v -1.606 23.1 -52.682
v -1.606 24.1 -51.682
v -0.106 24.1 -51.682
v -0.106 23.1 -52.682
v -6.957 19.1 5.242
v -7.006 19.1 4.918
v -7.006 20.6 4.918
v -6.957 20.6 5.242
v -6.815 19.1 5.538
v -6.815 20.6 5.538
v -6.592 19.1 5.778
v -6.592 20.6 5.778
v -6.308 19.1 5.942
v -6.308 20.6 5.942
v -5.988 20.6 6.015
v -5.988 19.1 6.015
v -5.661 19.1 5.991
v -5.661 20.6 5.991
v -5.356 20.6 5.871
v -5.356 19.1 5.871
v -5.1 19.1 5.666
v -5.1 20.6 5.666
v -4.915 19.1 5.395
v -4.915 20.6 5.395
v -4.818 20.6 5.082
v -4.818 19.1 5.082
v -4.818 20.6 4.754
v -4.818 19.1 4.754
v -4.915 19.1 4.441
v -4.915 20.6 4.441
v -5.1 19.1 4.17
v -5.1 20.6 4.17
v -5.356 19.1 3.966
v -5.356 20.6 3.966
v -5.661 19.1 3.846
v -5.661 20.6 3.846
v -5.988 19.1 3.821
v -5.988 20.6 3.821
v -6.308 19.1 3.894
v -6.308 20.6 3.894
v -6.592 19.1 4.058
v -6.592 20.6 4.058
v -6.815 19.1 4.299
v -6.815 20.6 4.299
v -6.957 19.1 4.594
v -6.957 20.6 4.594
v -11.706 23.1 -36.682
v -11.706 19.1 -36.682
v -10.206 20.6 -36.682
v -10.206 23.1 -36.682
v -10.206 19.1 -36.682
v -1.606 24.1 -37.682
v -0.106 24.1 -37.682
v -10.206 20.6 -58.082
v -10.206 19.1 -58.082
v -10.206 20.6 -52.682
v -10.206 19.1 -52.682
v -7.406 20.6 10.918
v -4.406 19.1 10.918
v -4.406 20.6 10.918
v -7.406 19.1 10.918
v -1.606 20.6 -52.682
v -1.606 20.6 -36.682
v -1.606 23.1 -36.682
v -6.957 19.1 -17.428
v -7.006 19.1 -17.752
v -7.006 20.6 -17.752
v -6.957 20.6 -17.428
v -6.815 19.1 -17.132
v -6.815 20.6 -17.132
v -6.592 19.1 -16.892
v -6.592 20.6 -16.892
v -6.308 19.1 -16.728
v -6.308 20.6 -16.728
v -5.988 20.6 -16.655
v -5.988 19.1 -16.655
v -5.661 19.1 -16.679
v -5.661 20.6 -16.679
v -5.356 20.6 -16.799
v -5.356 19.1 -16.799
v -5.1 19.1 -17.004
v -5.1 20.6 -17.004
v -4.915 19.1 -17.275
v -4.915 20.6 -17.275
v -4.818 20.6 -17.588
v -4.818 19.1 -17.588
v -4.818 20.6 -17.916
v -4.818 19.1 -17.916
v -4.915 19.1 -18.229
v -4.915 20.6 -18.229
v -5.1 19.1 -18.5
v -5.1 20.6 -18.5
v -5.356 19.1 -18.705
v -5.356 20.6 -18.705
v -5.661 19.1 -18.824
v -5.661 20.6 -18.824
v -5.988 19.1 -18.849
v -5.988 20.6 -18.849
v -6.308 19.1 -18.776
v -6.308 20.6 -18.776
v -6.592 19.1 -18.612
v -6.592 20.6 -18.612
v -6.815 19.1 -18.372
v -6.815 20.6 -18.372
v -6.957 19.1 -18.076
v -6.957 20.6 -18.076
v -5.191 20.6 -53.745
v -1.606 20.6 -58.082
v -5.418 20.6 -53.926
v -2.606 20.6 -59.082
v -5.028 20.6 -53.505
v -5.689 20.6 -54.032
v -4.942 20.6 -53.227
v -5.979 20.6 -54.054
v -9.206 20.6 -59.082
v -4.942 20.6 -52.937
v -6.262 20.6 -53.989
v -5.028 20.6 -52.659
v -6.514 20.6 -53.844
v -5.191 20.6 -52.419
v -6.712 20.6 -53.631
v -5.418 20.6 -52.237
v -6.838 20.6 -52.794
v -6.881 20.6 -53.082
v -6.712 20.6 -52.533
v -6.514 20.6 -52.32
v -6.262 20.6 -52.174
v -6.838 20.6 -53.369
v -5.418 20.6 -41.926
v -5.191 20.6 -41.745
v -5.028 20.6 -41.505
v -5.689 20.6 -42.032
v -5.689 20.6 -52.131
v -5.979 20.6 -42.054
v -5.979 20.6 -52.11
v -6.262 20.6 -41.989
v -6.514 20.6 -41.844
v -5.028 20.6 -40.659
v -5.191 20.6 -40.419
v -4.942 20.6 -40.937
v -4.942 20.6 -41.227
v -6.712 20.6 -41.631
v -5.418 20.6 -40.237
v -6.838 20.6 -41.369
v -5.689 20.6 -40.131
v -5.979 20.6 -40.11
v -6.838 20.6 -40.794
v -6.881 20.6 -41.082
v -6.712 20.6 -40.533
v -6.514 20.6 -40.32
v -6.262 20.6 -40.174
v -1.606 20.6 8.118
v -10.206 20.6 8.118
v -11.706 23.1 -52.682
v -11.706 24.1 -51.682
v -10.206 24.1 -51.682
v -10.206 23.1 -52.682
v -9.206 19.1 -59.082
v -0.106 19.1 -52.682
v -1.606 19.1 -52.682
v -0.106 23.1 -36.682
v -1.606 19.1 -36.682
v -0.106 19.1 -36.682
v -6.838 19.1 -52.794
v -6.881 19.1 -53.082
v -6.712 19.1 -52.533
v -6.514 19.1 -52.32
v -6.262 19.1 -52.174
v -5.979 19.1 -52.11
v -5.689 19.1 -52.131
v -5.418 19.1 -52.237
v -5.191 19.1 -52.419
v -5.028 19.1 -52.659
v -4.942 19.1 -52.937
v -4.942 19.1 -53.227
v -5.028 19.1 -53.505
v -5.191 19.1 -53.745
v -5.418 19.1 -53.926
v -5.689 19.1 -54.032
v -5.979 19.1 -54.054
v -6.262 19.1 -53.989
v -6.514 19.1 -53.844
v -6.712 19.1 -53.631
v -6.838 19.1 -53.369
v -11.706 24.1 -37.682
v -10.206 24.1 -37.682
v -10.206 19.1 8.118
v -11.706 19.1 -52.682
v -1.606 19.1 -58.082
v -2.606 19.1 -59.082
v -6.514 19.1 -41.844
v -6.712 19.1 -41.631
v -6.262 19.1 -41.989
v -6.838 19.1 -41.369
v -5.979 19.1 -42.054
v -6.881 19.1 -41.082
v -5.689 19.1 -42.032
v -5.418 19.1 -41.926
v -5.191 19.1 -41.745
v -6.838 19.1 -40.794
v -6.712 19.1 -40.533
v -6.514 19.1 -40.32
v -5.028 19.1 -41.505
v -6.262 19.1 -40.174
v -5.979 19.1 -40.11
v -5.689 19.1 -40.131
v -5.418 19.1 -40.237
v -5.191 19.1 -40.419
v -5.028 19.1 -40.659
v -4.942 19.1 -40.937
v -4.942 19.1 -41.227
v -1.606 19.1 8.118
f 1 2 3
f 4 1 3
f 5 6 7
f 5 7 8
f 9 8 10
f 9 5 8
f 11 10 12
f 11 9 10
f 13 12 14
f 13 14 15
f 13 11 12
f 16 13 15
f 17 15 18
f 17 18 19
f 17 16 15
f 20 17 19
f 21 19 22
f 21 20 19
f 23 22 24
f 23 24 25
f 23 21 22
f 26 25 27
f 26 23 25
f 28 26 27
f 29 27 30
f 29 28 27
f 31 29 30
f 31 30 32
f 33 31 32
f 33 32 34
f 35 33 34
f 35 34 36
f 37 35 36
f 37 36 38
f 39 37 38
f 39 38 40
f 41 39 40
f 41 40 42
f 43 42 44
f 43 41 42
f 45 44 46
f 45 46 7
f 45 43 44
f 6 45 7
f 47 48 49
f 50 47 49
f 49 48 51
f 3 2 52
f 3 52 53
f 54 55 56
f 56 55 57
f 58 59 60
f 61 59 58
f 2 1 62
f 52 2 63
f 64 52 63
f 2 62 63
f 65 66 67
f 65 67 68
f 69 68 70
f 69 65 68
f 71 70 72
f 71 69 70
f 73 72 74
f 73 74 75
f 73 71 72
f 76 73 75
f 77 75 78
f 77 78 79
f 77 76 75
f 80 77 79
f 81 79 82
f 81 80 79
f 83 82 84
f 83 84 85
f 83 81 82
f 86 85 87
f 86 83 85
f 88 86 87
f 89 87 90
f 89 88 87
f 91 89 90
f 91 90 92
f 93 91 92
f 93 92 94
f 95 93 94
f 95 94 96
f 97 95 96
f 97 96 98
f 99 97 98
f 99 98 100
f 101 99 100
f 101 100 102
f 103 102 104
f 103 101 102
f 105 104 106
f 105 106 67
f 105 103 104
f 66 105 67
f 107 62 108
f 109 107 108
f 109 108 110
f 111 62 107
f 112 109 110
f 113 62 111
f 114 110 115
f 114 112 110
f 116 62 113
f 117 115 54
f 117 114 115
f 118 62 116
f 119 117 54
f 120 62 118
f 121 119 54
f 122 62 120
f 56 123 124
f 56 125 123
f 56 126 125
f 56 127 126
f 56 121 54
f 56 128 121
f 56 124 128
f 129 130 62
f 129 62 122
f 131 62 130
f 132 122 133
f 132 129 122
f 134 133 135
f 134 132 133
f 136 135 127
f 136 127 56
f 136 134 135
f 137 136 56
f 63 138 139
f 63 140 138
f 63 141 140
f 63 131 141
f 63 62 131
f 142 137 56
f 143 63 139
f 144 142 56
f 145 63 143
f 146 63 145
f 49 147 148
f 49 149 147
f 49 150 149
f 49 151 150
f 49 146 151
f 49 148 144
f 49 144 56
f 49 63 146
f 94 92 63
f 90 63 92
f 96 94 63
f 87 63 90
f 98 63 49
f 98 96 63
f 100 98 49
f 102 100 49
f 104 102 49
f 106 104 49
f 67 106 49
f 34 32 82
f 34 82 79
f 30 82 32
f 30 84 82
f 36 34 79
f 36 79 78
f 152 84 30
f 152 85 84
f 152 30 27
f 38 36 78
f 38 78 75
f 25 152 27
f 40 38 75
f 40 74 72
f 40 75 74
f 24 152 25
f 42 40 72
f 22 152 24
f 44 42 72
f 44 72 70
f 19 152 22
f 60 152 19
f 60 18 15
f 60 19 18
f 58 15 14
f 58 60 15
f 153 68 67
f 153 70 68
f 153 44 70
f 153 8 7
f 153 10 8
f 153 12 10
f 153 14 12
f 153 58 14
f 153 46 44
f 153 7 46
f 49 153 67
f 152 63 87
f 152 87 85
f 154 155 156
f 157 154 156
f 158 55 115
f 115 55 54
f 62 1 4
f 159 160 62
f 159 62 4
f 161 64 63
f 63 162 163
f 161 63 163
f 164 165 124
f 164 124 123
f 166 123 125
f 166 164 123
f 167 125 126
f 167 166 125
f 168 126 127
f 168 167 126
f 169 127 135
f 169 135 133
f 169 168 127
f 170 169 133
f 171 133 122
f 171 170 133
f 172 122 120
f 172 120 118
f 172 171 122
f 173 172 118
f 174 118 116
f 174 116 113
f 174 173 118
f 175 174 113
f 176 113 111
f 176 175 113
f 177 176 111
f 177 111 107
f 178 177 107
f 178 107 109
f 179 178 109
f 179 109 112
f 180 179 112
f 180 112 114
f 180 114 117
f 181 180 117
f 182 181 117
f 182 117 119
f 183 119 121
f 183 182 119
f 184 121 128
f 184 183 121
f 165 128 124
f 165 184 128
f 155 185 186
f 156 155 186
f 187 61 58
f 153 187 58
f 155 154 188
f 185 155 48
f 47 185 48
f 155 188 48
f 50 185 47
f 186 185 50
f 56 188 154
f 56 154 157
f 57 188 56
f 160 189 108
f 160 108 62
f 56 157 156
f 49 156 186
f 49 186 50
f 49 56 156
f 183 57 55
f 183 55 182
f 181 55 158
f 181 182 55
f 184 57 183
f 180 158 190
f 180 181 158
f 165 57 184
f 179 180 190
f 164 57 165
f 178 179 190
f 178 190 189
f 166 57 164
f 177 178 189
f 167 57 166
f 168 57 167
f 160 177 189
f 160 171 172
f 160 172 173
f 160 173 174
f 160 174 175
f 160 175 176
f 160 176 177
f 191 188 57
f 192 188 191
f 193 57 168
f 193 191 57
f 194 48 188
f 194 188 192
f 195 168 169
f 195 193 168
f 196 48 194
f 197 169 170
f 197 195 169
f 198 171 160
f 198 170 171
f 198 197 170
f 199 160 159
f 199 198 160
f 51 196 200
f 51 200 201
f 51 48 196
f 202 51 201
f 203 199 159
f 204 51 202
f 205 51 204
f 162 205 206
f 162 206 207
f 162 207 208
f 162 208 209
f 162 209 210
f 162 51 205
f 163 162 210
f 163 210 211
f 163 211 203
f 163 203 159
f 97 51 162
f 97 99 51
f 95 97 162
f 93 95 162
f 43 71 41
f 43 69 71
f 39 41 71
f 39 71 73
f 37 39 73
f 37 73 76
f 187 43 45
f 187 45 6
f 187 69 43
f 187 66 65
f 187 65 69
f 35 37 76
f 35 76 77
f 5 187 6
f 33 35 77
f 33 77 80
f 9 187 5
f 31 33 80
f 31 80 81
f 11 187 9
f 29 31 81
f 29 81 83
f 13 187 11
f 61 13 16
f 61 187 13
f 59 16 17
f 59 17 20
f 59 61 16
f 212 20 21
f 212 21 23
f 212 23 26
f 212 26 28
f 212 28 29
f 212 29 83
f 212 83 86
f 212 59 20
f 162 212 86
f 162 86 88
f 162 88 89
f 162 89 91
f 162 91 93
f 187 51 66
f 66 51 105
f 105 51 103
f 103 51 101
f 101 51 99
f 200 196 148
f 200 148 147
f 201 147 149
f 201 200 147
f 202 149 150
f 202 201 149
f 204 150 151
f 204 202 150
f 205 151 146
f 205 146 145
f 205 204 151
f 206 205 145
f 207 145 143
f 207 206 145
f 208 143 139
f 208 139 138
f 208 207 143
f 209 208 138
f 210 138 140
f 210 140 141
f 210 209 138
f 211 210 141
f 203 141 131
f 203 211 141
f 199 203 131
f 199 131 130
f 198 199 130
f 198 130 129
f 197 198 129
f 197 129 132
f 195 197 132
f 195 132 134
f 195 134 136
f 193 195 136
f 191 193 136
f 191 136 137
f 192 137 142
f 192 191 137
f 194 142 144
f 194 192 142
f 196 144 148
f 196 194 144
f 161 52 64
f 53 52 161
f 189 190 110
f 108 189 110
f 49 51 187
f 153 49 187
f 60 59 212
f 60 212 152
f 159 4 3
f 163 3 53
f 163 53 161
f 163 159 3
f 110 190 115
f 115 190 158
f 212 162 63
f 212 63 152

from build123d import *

# Parameters (mm, degrees)
SKETCH006_W              = 8.6
SKETCH006_H              = 70
SKETCH006_R              = 1.1
SKETCH006_R_2            = 0.975
PAD005_DEPTH             = 1.5
SKETCH007_W              = 1.5
SKETCH007_H              = 16
PAD006_DEPTH             = 5
CHAMFER001_SIZE          = 2.8
CHAMFER002_SIZE          = 1
CLONE002_PLACEMENT_ANGLE = 180


with BuildPart() as part:
    # Sketch006 (on Face74 of Binder003) → Pad005 (new body)
    with BuildSketch(Plane(origin=(-7.1e-05, -19.1, 0.000123), x_dir=(1, -4e-06, 0), z_dir=(-4e-06, -1, 6e-06))):
        with Locations((12.106057, -34.481964)):
            Rectangle(SKETCH006_W, SKETCH006_H)
        with Locations((12.106057, -5.481964)):
            Circle(SKETCH006_R, mode=Mode.SUBTRACT)
        with Locations((12.106057, -28.152043)):
            Circle(SKETCH006_R, mode=Mode.SUBTRACT)
        with Locations((12.106057, -51.481964)):
            Circle(SKETCH006_R_2, mode=Mode.SUBTRACT)
        with Locations((12.106057, -63.481964)):
            Circle(SKETCH006_R_2, mode=Mode.SUBTRACT)
    extrude(amount=PAD005_DEPTH)

    # Sketch007 (on Face9 of Pad005) → Pad006 (join)
    with BuildSketch(Plane(origin=(-7.1e-05, -19.1, 0.000123), x_dir=(-1, 4e-06, 0), z_dir=(4e-06, 1, -6e-06))):
        with Locations((-17.156057, -55.081964)):
            Rectangle(SKETCH007_W, SKETCH007_H)
        with Locations((-7.056057, -55.081964)):
            Rectangle(SKETCH007_W, SKETCH007_H)
    extrude(amount=-PAD006_DEPTH)

    # Chamfer001
    chamfer001_edges = [part.edges().sort_by_distance(p)[0] for p in [
        (16.405983, -19.850058, 0.518165),
        (7.805983, -19.850026, 0.518165),
    ]]
    chamfer(chamfer001_edges, length=CHAMFER001_SIZE)

    # Chamfer002
    chamfer002_edges = [part.edges().sort_by_distance(p)[0] for p in [
        (17.155967, -24.100368, -47.081808),
        (17.155967, -24.100471, -63.081808),
        (7.055967, -24.100433, -63.081808),
        (7.055967, -24.10033, -47.081808),
        (16.405983, -19.850509, -69.481835),
        (7.805983, -19.850477, -69.481835),
    ]]
    chamfer(chamfer002_edges, length=CHAMFER002_SIZE)


with BuildPart() as part_1:
    # Clone002 placement: moved
    add(part.part.moved(Location((6.2, 0, 10.4))).rotate(Axis((6.2, 0, 10.4), (0, 0, 1)), CLONE002_PLACEMENT_ANGLE))


solid = part_1.part
